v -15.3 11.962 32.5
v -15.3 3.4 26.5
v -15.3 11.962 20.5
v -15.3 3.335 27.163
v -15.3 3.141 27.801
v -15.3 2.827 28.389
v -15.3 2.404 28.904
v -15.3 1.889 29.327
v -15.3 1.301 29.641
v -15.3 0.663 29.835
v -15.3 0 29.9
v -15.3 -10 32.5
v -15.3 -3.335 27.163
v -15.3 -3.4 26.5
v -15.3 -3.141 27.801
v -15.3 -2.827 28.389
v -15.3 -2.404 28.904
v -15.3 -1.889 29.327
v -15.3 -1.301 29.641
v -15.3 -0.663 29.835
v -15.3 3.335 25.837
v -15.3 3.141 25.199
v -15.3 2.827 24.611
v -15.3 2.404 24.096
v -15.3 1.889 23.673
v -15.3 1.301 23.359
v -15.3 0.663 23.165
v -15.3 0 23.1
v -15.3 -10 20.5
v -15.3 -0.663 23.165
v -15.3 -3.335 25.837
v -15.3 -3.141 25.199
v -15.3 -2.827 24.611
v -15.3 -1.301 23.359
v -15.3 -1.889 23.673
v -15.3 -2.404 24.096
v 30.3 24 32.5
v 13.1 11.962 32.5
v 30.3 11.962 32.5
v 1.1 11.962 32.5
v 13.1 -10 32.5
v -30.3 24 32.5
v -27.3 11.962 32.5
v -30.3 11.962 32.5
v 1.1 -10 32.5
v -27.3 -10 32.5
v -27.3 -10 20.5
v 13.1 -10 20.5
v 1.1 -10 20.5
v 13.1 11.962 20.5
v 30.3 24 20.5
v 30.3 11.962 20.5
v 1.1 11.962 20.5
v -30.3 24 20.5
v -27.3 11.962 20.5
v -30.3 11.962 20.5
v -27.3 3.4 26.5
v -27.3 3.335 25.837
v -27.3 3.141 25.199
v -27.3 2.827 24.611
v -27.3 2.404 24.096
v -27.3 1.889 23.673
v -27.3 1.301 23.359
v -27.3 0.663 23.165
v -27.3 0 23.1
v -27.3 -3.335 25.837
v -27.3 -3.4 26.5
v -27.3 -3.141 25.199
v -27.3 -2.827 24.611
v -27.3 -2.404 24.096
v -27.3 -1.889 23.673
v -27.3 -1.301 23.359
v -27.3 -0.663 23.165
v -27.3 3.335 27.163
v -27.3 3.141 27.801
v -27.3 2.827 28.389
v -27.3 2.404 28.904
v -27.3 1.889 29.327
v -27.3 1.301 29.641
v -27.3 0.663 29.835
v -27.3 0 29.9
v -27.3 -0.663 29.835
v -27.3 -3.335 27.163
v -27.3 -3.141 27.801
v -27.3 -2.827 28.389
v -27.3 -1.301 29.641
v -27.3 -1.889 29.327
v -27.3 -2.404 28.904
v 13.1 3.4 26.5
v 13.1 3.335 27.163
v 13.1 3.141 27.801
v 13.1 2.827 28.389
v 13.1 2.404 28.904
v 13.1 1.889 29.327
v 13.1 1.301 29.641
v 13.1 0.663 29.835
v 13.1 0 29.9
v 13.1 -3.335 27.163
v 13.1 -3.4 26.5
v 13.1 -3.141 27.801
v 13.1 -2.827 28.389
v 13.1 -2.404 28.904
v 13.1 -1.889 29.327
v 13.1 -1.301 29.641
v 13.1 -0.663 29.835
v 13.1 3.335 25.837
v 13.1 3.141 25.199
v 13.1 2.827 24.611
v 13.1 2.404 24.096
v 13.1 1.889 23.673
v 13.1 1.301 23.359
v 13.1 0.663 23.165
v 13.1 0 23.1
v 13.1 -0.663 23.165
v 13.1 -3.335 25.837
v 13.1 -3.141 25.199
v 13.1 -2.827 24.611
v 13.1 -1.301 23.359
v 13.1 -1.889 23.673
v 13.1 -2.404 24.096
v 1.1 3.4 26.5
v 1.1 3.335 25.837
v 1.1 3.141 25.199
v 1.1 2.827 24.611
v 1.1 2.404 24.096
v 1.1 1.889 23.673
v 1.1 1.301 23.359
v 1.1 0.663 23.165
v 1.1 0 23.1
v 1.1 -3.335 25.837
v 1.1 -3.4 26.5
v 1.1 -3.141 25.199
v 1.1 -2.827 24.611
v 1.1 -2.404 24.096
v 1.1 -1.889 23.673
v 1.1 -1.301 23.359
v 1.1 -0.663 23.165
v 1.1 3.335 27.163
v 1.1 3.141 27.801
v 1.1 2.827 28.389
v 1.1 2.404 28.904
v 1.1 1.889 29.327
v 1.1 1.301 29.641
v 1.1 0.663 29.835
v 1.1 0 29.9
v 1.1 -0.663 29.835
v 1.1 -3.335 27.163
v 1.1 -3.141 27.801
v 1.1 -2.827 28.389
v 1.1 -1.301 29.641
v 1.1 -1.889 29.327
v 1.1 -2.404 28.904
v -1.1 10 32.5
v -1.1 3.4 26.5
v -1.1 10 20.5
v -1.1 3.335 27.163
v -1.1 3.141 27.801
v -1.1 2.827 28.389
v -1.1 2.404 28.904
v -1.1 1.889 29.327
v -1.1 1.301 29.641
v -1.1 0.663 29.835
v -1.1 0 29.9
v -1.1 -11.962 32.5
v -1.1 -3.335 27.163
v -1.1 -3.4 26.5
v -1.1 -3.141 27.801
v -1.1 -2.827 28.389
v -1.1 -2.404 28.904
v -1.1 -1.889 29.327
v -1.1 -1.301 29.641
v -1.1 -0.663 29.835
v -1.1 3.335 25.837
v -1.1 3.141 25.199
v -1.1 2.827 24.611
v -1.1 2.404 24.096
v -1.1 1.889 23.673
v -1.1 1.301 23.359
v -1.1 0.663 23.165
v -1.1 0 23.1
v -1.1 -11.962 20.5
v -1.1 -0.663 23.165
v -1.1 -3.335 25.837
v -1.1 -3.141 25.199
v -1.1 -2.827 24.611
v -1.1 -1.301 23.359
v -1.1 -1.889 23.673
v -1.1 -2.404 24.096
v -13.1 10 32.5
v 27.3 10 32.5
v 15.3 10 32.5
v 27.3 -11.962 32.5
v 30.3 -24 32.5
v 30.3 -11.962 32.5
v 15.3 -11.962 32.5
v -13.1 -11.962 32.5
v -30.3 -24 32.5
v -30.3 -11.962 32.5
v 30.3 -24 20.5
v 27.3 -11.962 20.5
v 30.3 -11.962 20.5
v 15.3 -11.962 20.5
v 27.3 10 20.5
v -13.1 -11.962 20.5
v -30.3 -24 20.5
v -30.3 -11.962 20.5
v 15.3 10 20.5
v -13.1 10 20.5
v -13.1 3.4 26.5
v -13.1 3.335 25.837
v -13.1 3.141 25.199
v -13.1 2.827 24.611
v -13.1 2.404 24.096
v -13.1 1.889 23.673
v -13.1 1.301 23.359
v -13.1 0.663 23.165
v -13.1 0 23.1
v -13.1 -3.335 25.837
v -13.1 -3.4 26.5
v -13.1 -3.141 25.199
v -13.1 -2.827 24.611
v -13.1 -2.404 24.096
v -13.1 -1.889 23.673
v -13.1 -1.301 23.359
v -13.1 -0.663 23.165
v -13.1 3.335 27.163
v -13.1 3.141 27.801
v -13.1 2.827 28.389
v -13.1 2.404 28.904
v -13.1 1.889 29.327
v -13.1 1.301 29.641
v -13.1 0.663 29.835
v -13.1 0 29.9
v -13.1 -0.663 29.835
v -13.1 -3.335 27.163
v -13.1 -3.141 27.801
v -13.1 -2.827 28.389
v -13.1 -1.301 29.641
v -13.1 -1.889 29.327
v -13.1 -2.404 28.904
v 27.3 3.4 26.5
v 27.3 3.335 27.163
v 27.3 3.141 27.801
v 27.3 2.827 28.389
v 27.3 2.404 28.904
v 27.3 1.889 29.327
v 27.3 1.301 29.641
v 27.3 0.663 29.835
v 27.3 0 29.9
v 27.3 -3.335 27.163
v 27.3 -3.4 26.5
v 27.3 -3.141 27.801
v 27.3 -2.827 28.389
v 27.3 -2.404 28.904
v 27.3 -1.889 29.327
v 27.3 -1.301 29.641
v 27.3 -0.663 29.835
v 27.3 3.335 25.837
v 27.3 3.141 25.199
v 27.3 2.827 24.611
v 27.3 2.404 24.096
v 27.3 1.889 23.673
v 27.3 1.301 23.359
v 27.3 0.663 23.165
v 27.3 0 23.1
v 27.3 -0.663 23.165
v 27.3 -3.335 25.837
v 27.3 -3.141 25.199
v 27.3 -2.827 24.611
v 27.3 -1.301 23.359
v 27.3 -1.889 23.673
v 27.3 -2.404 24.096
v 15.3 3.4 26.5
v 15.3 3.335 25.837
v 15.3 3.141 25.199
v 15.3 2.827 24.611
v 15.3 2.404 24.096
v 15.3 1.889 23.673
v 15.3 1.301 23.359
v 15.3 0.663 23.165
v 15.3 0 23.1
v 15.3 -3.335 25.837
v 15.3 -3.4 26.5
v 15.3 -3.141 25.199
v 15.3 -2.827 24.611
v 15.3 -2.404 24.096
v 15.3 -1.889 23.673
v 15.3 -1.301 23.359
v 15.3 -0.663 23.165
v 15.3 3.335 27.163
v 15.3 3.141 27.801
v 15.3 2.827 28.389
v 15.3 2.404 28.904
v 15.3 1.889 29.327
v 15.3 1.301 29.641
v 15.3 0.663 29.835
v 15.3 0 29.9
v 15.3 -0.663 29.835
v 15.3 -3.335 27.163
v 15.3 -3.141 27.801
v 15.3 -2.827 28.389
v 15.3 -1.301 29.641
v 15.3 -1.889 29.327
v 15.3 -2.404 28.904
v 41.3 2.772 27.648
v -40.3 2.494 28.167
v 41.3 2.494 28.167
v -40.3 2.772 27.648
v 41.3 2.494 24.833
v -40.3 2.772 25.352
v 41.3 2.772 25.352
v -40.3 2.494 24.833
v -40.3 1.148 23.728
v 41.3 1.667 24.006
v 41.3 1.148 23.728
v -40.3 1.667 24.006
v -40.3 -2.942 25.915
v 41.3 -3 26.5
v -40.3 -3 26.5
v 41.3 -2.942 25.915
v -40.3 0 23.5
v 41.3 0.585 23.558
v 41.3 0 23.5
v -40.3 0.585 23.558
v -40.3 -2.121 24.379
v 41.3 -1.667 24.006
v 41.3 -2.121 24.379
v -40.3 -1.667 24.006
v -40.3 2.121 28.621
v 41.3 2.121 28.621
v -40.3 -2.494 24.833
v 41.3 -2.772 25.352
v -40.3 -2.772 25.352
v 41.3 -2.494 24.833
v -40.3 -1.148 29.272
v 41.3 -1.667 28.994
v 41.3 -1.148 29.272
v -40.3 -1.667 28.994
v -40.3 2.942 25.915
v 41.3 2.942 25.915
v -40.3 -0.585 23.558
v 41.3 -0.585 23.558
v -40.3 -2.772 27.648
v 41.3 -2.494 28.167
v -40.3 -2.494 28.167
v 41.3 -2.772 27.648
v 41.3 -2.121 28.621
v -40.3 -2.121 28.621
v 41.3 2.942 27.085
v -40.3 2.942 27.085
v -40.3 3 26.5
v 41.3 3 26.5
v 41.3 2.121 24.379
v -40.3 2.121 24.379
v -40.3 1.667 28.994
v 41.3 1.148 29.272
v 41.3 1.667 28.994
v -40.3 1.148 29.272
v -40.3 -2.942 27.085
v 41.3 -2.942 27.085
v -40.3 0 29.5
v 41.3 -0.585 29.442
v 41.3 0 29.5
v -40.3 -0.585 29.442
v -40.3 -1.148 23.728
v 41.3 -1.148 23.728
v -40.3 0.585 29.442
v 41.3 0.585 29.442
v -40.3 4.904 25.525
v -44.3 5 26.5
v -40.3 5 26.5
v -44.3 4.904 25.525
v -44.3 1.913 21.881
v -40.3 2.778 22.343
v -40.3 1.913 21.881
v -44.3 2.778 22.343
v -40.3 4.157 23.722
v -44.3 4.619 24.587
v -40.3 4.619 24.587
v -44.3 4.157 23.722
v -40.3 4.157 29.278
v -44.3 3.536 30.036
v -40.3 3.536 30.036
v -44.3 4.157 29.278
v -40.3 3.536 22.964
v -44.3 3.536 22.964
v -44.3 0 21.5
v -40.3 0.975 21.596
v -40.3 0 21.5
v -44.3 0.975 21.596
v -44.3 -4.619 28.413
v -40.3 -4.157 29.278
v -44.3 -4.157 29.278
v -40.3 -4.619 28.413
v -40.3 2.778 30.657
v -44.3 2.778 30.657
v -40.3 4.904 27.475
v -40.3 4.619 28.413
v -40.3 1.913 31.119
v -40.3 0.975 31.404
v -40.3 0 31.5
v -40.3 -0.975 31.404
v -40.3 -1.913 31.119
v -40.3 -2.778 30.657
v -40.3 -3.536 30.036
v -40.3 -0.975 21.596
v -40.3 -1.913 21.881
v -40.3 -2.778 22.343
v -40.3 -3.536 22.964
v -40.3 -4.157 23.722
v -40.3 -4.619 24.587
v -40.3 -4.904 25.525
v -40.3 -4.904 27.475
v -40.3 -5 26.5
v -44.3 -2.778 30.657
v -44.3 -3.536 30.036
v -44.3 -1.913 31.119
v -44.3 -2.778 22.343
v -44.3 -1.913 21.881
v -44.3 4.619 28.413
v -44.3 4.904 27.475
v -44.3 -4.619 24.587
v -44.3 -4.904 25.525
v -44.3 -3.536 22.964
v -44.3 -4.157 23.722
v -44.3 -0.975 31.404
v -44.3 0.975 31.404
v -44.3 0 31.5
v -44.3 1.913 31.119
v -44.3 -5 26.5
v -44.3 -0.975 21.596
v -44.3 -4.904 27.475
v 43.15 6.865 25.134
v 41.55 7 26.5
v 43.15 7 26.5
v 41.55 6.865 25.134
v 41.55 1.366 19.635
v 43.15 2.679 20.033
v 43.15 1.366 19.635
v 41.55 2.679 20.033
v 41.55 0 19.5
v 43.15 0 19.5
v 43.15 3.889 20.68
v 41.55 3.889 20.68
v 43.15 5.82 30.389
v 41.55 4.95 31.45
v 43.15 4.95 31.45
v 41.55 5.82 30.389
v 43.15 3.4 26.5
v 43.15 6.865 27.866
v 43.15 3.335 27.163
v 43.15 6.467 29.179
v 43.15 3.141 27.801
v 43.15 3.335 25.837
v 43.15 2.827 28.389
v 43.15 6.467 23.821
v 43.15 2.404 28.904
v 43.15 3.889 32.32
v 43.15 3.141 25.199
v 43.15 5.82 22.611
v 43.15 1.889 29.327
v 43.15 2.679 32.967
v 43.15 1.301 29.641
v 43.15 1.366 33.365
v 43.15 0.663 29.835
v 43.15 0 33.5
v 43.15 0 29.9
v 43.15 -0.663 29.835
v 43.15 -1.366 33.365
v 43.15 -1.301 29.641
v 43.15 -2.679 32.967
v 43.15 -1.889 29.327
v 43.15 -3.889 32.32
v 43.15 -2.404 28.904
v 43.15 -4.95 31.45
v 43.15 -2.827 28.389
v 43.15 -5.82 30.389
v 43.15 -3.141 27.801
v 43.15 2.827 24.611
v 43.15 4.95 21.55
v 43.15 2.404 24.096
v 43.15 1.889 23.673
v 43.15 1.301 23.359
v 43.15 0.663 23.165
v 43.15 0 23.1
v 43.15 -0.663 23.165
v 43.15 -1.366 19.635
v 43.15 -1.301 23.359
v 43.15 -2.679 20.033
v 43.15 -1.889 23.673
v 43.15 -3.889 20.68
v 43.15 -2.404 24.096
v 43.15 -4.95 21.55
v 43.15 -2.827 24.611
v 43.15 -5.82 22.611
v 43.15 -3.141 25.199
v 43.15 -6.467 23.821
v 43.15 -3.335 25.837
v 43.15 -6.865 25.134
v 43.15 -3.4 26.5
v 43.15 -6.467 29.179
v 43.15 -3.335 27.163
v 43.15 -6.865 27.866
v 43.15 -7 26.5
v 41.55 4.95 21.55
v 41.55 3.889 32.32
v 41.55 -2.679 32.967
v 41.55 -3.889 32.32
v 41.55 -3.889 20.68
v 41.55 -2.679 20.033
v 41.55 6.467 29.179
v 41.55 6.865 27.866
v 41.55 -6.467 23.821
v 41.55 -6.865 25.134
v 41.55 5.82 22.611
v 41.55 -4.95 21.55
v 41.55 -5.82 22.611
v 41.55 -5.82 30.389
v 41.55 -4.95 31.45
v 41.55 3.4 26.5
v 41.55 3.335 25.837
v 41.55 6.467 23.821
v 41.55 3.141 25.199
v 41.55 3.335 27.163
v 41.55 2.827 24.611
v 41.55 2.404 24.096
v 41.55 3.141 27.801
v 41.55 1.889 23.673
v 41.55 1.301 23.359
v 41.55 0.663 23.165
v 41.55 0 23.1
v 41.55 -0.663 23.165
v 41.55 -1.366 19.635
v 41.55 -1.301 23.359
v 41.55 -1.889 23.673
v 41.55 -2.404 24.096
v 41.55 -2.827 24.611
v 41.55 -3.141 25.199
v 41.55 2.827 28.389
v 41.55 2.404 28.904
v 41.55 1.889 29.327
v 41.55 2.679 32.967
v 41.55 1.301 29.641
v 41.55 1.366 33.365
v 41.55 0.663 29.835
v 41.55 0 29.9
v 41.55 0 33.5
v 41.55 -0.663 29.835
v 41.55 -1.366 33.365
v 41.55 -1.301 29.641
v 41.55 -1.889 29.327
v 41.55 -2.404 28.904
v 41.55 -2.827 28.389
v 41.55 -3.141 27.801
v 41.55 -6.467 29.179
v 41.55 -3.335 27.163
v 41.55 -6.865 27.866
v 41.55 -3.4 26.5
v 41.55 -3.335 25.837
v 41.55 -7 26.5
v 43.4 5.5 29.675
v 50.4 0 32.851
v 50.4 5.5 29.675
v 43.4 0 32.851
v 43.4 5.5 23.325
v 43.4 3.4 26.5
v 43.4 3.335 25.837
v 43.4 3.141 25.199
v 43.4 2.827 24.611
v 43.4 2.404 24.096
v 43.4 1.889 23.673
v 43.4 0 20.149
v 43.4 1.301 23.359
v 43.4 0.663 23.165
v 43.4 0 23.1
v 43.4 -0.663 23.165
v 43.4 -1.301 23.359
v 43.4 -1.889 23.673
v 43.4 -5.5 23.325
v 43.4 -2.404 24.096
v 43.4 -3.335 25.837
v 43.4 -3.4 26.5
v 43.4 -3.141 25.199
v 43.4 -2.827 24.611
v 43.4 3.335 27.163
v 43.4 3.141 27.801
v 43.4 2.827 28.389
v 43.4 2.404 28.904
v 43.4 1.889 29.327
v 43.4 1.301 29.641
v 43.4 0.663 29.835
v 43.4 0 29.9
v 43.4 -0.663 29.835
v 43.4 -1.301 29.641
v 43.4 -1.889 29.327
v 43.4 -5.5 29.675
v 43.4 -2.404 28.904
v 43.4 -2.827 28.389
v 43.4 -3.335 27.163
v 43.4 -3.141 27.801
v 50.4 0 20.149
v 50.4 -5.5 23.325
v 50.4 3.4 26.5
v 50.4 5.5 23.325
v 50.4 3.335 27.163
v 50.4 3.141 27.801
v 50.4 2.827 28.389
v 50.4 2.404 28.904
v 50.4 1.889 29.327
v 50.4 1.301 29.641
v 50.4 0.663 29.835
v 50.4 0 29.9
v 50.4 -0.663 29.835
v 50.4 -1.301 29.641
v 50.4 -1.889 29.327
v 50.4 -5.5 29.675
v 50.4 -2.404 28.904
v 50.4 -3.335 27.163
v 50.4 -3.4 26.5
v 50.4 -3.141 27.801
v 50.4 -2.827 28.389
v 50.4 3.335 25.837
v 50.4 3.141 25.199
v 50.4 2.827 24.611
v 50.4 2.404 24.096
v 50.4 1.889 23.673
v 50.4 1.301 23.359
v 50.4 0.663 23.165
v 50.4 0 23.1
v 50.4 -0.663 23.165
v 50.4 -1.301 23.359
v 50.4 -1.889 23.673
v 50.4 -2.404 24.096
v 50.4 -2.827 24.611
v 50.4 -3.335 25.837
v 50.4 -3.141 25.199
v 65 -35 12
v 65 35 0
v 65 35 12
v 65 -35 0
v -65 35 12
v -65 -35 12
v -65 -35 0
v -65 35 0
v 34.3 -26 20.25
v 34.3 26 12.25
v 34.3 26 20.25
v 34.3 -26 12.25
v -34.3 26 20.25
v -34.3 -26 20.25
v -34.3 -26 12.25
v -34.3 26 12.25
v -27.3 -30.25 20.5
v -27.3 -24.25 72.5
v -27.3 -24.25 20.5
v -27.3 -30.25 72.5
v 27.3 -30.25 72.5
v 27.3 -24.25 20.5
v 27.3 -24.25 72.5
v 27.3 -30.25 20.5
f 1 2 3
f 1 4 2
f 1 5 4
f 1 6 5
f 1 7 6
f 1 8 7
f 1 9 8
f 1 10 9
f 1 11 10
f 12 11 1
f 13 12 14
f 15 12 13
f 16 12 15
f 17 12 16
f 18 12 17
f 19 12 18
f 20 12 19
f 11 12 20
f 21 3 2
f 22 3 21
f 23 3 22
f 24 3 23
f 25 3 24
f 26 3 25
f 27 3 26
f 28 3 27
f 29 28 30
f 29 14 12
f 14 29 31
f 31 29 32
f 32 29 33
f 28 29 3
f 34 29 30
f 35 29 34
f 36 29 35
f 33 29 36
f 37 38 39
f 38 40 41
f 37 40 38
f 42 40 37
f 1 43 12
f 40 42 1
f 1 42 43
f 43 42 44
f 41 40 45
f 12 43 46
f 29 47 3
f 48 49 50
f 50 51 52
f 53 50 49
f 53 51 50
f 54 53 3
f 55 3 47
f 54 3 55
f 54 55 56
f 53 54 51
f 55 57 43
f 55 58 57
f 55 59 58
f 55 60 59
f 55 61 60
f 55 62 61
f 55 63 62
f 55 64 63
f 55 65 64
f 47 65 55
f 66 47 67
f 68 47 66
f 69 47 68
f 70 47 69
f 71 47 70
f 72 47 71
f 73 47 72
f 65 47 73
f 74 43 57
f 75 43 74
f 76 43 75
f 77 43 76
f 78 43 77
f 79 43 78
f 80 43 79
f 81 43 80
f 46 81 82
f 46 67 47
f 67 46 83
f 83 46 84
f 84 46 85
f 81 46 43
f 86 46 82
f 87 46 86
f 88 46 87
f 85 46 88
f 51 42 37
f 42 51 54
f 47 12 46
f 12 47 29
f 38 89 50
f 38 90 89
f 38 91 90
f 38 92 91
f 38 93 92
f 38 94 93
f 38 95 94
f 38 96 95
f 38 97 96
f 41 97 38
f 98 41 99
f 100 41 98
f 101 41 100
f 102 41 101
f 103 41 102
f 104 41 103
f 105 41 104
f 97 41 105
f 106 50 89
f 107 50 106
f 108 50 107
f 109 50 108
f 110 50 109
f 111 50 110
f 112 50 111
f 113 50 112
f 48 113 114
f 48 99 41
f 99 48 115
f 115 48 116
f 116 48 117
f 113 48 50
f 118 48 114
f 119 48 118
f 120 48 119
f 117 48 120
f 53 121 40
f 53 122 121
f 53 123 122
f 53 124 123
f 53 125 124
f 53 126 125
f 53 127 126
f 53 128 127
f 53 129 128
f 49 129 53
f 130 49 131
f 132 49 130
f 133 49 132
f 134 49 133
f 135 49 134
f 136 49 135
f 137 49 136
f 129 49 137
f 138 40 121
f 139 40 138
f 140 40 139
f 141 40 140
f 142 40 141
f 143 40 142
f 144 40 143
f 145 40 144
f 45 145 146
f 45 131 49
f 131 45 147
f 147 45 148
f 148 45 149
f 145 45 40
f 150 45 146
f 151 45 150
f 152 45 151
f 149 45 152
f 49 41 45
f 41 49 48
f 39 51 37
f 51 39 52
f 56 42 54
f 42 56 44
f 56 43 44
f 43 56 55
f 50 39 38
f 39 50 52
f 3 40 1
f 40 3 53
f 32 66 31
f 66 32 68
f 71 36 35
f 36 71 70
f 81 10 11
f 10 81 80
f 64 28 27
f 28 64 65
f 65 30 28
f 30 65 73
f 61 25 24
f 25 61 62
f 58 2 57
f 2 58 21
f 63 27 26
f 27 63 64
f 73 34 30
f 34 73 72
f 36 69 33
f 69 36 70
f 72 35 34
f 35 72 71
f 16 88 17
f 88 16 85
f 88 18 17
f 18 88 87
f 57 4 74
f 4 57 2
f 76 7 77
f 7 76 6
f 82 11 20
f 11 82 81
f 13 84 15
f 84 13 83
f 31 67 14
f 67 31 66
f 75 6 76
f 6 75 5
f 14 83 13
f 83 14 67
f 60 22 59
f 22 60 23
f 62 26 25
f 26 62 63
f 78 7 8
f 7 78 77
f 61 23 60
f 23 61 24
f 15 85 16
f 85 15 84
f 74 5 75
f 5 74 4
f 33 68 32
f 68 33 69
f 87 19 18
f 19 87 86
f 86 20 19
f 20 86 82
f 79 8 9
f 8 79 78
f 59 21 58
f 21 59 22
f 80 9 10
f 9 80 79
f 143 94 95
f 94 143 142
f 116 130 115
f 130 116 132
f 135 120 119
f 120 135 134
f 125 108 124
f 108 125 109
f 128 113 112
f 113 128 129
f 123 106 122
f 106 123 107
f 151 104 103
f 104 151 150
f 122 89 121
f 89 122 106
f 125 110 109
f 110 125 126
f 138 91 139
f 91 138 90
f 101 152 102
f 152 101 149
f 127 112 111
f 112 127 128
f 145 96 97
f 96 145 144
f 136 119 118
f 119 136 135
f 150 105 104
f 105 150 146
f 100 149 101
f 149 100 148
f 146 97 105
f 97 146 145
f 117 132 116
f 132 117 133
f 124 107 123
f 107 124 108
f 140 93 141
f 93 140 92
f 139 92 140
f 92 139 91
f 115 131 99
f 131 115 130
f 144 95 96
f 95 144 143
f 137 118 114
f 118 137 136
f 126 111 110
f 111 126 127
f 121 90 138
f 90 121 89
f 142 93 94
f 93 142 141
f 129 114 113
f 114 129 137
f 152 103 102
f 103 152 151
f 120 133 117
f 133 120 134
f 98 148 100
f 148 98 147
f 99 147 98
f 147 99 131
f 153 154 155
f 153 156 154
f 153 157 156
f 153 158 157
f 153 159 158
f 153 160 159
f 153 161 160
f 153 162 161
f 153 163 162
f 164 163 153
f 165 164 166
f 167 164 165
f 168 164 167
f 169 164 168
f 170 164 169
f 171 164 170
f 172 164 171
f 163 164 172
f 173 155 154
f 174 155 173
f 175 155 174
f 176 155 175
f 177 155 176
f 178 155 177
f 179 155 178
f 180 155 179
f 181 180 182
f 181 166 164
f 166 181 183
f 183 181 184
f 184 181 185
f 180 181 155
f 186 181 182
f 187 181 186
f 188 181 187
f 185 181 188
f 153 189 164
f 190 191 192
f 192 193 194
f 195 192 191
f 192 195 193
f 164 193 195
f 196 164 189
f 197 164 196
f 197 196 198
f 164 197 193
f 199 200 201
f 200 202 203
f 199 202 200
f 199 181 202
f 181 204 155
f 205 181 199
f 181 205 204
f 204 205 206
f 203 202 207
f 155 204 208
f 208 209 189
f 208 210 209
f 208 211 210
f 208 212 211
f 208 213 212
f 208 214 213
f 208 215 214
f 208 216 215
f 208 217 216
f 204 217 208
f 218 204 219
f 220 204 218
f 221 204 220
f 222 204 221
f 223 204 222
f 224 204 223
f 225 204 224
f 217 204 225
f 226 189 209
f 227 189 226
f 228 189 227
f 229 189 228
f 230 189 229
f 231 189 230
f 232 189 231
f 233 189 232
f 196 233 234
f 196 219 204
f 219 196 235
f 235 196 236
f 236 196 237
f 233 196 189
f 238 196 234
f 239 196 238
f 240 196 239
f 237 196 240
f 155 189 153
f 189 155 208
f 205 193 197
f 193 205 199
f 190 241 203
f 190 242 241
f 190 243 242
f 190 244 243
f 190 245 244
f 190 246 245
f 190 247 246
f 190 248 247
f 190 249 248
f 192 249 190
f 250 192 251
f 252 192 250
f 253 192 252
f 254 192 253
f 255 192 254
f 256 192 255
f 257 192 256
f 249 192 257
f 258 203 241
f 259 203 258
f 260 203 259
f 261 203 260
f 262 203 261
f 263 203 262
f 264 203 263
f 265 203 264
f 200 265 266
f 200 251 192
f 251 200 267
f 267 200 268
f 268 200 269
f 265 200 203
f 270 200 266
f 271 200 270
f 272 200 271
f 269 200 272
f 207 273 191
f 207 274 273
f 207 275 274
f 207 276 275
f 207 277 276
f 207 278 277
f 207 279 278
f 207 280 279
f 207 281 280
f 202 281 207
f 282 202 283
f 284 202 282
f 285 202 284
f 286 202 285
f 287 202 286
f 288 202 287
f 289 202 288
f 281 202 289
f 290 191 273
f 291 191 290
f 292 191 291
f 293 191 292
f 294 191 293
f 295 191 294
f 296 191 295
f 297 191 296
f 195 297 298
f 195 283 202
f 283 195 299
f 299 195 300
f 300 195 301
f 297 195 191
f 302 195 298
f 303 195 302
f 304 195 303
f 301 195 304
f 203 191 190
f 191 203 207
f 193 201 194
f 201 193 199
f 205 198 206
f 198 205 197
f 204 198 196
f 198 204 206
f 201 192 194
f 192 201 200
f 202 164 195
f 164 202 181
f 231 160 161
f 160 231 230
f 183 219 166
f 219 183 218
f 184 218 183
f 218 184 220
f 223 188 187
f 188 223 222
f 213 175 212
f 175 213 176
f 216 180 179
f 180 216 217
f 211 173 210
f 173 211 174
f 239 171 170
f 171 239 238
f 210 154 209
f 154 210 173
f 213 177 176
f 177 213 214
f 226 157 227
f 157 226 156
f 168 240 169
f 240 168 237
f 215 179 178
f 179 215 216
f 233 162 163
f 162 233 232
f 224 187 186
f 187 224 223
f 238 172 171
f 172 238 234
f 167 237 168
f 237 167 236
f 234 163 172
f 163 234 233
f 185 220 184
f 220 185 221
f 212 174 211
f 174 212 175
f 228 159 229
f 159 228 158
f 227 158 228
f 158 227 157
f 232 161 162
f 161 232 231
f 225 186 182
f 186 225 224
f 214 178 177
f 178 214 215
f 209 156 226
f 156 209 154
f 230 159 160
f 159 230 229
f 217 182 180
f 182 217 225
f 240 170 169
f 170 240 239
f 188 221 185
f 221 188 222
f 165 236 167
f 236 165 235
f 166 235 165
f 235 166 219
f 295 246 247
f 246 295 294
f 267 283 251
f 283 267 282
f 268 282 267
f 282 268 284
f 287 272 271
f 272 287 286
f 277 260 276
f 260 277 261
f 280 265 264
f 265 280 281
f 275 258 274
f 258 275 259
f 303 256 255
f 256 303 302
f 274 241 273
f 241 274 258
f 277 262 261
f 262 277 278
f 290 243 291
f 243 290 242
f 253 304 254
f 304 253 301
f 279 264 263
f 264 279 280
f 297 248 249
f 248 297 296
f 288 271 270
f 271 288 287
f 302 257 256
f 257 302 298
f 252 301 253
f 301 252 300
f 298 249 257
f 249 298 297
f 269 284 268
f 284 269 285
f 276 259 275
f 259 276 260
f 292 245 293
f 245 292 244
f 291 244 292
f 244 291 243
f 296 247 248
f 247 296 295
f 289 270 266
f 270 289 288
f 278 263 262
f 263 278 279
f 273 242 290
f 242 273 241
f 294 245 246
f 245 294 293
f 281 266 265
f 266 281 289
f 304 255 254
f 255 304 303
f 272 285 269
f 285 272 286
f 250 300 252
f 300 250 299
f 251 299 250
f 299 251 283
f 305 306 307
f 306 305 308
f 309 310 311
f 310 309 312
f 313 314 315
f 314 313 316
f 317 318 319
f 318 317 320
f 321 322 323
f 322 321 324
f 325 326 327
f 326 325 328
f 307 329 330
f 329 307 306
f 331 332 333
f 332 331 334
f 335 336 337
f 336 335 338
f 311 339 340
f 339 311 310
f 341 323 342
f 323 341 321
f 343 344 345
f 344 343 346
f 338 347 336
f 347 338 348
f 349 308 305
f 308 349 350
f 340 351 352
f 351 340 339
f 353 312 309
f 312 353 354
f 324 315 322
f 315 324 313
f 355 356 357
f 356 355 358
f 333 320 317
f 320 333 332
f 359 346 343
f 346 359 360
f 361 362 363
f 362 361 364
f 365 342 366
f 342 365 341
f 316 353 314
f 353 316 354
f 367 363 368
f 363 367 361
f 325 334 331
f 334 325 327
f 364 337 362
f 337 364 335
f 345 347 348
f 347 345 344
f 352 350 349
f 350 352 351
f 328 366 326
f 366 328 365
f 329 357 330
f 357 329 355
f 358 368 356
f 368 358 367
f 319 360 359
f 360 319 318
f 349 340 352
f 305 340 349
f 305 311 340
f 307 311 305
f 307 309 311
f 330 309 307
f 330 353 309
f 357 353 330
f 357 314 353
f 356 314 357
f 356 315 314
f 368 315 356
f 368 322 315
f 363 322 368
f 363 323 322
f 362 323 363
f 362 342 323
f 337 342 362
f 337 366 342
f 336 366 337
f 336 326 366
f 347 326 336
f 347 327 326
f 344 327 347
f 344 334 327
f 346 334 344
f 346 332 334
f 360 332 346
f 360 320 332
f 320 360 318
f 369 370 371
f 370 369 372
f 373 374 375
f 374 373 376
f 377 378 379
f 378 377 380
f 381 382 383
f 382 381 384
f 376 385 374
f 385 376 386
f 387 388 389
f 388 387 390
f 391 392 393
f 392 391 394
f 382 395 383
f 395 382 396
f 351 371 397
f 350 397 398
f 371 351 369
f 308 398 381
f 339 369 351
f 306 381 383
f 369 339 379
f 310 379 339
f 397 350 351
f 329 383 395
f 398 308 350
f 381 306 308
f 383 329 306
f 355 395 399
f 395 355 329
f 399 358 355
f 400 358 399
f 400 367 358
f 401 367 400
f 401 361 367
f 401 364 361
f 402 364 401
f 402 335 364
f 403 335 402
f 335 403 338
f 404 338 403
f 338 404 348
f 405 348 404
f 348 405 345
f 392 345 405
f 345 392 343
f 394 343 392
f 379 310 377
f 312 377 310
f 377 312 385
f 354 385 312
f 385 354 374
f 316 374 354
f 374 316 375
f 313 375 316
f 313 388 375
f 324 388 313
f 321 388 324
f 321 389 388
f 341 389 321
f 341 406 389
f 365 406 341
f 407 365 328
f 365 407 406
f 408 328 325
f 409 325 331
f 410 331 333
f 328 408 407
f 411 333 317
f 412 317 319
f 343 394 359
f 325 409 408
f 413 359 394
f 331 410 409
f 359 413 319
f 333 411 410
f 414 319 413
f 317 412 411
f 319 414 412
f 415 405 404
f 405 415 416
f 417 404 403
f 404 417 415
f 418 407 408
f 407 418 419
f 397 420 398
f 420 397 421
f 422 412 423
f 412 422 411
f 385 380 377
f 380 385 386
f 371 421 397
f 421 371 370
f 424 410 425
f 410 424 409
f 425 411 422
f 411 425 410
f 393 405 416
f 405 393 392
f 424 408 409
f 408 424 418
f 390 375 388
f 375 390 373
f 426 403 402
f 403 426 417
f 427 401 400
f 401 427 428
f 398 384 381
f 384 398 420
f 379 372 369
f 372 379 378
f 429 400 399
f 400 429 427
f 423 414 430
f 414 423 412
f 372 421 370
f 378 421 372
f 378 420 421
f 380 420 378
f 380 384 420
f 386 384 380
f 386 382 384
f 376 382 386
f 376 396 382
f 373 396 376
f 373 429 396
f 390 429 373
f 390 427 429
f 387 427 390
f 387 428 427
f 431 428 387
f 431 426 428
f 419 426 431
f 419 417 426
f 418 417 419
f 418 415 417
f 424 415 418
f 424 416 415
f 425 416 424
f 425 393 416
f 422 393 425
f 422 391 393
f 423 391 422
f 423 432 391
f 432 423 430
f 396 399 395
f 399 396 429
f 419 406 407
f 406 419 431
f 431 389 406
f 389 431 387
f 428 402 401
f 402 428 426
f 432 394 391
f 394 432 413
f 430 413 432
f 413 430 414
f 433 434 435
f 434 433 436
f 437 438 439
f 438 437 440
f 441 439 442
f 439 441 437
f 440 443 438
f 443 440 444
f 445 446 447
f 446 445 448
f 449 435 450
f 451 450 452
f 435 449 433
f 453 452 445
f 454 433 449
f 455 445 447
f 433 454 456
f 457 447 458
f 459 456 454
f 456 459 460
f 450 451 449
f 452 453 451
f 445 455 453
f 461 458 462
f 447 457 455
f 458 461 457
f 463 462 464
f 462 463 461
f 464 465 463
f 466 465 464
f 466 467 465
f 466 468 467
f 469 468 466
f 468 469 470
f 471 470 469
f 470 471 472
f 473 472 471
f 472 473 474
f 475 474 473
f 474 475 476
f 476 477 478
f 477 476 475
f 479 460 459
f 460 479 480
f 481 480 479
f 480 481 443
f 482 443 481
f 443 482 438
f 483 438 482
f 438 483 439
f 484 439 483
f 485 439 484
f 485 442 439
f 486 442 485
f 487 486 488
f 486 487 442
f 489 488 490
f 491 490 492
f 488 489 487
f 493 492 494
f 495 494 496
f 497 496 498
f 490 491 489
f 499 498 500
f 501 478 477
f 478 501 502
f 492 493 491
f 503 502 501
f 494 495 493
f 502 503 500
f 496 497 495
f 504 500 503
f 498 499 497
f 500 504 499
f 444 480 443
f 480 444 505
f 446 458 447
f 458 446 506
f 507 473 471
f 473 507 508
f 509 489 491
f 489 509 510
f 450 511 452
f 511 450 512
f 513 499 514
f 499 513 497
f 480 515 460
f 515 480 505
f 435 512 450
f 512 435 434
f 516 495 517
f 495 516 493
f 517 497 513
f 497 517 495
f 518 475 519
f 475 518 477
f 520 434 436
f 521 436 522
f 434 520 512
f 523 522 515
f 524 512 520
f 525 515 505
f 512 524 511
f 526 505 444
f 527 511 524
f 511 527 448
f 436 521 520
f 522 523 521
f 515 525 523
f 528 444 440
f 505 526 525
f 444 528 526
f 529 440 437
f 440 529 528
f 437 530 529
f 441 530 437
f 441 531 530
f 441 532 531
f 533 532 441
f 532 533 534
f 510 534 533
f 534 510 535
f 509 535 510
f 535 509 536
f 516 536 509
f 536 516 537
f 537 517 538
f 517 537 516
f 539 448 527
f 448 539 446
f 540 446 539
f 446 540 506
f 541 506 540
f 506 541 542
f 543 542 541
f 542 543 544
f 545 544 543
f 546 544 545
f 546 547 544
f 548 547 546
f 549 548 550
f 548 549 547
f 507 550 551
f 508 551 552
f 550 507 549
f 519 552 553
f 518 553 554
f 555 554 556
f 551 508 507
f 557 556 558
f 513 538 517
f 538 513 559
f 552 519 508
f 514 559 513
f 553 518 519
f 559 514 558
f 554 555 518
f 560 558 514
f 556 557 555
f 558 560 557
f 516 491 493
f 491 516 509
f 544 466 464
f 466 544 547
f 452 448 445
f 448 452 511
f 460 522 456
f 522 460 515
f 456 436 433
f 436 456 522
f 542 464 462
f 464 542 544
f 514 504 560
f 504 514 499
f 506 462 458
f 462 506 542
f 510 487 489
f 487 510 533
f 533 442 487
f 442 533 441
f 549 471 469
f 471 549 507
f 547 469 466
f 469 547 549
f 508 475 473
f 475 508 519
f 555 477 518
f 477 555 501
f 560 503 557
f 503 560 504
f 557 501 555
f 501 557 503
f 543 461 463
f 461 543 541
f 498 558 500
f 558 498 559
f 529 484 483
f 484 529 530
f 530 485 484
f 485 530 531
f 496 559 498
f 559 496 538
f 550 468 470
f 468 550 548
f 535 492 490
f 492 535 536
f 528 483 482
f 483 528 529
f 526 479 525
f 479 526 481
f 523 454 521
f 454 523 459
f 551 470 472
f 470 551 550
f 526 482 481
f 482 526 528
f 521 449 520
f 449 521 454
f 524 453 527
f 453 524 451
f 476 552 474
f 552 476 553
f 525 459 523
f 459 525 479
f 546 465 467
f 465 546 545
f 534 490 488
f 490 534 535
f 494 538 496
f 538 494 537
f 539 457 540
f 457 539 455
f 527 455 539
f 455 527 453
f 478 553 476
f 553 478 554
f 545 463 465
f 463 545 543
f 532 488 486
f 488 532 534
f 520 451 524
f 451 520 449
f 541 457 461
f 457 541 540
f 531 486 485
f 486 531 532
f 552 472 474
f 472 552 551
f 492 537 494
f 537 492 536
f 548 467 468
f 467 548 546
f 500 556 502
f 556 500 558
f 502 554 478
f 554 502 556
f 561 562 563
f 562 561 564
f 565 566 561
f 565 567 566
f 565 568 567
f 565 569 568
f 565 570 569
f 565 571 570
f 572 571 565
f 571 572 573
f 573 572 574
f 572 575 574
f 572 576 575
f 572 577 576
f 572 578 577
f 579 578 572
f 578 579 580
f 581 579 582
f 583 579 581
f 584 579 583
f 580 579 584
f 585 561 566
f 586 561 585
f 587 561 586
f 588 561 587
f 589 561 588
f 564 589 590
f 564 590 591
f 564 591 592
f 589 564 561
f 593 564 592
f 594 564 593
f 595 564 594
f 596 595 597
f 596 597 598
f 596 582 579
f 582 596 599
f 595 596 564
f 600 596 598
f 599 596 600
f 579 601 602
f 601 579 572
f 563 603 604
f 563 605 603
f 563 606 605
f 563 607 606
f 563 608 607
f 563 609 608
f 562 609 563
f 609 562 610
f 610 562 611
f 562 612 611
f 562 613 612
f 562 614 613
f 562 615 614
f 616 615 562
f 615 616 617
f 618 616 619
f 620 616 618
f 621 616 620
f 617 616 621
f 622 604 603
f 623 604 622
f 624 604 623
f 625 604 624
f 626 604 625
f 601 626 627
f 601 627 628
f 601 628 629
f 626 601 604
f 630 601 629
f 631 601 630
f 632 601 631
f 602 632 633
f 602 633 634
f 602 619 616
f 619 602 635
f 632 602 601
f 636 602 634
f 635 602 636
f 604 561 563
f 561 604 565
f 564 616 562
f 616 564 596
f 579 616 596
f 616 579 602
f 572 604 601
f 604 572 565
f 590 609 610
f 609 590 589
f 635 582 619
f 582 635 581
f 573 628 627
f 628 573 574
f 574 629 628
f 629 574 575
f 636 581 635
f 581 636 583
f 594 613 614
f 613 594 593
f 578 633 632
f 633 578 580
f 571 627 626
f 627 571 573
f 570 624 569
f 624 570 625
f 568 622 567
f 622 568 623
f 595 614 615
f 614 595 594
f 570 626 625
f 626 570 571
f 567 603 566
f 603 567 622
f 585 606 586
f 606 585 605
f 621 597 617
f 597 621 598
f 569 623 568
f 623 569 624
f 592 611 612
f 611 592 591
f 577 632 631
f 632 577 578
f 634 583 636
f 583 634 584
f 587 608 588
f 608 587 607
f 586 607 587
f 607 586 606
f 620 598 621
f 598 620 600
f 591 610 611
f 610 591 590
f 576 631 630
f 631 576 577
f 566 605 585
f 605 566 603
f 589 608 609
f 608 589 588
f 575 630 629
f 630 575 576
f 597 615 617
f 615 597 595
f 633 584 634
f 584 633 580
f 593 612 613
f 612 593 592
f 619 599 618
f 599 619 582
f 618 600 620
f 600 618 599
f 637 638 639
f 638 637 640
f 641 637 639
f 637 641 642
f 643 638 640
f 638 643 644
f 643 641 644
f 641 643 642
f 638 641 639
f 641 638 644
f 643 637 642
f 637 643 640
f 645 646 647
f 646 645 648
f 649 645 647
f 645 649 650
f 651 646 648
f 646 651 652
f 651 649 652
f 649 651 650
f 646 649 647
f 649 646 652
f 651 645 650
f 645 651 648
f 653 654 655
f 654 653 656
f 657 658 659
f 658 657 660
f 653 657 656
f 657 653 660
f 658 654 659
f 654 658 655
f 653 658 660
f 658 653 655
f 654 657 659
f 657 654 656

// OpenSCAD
$fn = 32;

// ------------------------------------------------------------------------
// Comb hinge with flap: leaf 60.6 x 24 mm, pin d6, flap 52 mm
// Every part is its own module, assembly() places every instance.
// ------------------------------------------------------------------------

// --- part 1 ---
module hinge_bed() {
  difference() {
    translate([-65, -35, 0]) cube([130, 70, 12]);
  }
}

// --- part 2 ---
module hinge_riser() {
  difference() {
    translate([-34.3, -26, 0]) cube([68.6, 52, 8]);
  }
}

// --- part 3 ---
module hinge_leaf_a() {
  difference() {
    union() {
      translate([-27.3, -10, -6]) cube([12, 34, 12]);
      translate([1.1, -10, -6]) cube([12, 34, 12]);
      translate([-30.3, 11.962, -6]) cube([60.6, 12.038, 12]);
    }
    translate([-21.3, 0, 0]) rotate([0, 90, 0]) cylinder(h = 14, d = 6.8, center = true);
    translate([7.1, 0, 0]) rotate([0, 90, 0]) cylinder(h = 14, d = 6.8, center = true);
  }
}

// --- part 4 ---
module hinge_leaf_b() {
  difference() {
    union() {
      translate([-13.1, -24, -6]) cube([12, 34, 12]);
      translate([15.3, -24, -6]) cube([12, 34, 12]);
      translate([-30.3, -24, -6]) cube([60.6, 12.038, 12]);
    }
    translate([-7.1, 0, 0]) rotate([0, 90, 0]) cylinder(h = 14, d = 6.8, center = true);
    translate([21.3, 0, 0]) rotate([0, 90, 0]) cylinder(h = 14, d = 6.8, center = true);
  }
}

// --- part 5 ---
module hinge_flap() {
  difference() {
    translate([-27.3, -26, 0]) cube([54.6, 52, 6]);
  }
}

// --- part 6 ---
module hinge_pin() {
  rotate([0, 90, 0]) cylinder(h = 82.6, d = 6, center = true);
  translate([-44.3, 0, 0]) rotate([0, 90, 0]) cylinder(h = 4, d = 10);
}

// --- part 7 ---
module pin_washer() {
  difference() {
      translate([0, 0, 0]) cylinder(h = 1.6, d = 14);
      translate([0, 0, -1]) cylinder(h = 3.6, d = 6.8);
    }
}

// --- part 8 ---
module pin_nut() {
  difference() {
    linear_extrude(height = 7) polygon(points = [[6.351, 0], [3.175, 5.5], [-3.175, 5.5], [-6.351, 0], [-3.175, -5.5], [3.175, -5.5]]);
    translate([0, 0, -1]) cylinder(h = 9, d = 6.8);
  }
}

// --- assembly ---
module assembly() {
  color([0.80, 0.24, 0.20]) translate([0, 0, 0]) rotate([0, 0, 0]) hinge_bed();
  color([0.20, 0.45, 0.75]) translate([0, 0, 12.25]) rotate([0, 0, 0]) hinge_riser();
  color([0.25, 0.62, 0.32]) translate([0, 0, 26.5]) rotate([0, 0, 0]) hinge_leaf_a();
  color([0.92, 0.70, 0.18]) translate([0, 0, 26.5]) rotate([0, 0, 0]) hinge_leaf_b();
  color([0.58, 0.35, 0.70]) translate([0, -24.25, 46.5]) rotate([90, 0, 0]) hinge_flap();
  color([0.16, 0.66, 0.66]) translate([0, 0, 26.5]) rotate([0, 0, 0]) hinge_pin();
  color([0.85, 0.48, 0.18]) translate([41.55, 0, 26.5]) rotate([0, 90, 0]) pin_washer();
  color([0.55, 0.60, 0.65]) translate([43.4, 0, 26.5]) rotate([0, 90, 0]) pin_nut();
}

assembly();
